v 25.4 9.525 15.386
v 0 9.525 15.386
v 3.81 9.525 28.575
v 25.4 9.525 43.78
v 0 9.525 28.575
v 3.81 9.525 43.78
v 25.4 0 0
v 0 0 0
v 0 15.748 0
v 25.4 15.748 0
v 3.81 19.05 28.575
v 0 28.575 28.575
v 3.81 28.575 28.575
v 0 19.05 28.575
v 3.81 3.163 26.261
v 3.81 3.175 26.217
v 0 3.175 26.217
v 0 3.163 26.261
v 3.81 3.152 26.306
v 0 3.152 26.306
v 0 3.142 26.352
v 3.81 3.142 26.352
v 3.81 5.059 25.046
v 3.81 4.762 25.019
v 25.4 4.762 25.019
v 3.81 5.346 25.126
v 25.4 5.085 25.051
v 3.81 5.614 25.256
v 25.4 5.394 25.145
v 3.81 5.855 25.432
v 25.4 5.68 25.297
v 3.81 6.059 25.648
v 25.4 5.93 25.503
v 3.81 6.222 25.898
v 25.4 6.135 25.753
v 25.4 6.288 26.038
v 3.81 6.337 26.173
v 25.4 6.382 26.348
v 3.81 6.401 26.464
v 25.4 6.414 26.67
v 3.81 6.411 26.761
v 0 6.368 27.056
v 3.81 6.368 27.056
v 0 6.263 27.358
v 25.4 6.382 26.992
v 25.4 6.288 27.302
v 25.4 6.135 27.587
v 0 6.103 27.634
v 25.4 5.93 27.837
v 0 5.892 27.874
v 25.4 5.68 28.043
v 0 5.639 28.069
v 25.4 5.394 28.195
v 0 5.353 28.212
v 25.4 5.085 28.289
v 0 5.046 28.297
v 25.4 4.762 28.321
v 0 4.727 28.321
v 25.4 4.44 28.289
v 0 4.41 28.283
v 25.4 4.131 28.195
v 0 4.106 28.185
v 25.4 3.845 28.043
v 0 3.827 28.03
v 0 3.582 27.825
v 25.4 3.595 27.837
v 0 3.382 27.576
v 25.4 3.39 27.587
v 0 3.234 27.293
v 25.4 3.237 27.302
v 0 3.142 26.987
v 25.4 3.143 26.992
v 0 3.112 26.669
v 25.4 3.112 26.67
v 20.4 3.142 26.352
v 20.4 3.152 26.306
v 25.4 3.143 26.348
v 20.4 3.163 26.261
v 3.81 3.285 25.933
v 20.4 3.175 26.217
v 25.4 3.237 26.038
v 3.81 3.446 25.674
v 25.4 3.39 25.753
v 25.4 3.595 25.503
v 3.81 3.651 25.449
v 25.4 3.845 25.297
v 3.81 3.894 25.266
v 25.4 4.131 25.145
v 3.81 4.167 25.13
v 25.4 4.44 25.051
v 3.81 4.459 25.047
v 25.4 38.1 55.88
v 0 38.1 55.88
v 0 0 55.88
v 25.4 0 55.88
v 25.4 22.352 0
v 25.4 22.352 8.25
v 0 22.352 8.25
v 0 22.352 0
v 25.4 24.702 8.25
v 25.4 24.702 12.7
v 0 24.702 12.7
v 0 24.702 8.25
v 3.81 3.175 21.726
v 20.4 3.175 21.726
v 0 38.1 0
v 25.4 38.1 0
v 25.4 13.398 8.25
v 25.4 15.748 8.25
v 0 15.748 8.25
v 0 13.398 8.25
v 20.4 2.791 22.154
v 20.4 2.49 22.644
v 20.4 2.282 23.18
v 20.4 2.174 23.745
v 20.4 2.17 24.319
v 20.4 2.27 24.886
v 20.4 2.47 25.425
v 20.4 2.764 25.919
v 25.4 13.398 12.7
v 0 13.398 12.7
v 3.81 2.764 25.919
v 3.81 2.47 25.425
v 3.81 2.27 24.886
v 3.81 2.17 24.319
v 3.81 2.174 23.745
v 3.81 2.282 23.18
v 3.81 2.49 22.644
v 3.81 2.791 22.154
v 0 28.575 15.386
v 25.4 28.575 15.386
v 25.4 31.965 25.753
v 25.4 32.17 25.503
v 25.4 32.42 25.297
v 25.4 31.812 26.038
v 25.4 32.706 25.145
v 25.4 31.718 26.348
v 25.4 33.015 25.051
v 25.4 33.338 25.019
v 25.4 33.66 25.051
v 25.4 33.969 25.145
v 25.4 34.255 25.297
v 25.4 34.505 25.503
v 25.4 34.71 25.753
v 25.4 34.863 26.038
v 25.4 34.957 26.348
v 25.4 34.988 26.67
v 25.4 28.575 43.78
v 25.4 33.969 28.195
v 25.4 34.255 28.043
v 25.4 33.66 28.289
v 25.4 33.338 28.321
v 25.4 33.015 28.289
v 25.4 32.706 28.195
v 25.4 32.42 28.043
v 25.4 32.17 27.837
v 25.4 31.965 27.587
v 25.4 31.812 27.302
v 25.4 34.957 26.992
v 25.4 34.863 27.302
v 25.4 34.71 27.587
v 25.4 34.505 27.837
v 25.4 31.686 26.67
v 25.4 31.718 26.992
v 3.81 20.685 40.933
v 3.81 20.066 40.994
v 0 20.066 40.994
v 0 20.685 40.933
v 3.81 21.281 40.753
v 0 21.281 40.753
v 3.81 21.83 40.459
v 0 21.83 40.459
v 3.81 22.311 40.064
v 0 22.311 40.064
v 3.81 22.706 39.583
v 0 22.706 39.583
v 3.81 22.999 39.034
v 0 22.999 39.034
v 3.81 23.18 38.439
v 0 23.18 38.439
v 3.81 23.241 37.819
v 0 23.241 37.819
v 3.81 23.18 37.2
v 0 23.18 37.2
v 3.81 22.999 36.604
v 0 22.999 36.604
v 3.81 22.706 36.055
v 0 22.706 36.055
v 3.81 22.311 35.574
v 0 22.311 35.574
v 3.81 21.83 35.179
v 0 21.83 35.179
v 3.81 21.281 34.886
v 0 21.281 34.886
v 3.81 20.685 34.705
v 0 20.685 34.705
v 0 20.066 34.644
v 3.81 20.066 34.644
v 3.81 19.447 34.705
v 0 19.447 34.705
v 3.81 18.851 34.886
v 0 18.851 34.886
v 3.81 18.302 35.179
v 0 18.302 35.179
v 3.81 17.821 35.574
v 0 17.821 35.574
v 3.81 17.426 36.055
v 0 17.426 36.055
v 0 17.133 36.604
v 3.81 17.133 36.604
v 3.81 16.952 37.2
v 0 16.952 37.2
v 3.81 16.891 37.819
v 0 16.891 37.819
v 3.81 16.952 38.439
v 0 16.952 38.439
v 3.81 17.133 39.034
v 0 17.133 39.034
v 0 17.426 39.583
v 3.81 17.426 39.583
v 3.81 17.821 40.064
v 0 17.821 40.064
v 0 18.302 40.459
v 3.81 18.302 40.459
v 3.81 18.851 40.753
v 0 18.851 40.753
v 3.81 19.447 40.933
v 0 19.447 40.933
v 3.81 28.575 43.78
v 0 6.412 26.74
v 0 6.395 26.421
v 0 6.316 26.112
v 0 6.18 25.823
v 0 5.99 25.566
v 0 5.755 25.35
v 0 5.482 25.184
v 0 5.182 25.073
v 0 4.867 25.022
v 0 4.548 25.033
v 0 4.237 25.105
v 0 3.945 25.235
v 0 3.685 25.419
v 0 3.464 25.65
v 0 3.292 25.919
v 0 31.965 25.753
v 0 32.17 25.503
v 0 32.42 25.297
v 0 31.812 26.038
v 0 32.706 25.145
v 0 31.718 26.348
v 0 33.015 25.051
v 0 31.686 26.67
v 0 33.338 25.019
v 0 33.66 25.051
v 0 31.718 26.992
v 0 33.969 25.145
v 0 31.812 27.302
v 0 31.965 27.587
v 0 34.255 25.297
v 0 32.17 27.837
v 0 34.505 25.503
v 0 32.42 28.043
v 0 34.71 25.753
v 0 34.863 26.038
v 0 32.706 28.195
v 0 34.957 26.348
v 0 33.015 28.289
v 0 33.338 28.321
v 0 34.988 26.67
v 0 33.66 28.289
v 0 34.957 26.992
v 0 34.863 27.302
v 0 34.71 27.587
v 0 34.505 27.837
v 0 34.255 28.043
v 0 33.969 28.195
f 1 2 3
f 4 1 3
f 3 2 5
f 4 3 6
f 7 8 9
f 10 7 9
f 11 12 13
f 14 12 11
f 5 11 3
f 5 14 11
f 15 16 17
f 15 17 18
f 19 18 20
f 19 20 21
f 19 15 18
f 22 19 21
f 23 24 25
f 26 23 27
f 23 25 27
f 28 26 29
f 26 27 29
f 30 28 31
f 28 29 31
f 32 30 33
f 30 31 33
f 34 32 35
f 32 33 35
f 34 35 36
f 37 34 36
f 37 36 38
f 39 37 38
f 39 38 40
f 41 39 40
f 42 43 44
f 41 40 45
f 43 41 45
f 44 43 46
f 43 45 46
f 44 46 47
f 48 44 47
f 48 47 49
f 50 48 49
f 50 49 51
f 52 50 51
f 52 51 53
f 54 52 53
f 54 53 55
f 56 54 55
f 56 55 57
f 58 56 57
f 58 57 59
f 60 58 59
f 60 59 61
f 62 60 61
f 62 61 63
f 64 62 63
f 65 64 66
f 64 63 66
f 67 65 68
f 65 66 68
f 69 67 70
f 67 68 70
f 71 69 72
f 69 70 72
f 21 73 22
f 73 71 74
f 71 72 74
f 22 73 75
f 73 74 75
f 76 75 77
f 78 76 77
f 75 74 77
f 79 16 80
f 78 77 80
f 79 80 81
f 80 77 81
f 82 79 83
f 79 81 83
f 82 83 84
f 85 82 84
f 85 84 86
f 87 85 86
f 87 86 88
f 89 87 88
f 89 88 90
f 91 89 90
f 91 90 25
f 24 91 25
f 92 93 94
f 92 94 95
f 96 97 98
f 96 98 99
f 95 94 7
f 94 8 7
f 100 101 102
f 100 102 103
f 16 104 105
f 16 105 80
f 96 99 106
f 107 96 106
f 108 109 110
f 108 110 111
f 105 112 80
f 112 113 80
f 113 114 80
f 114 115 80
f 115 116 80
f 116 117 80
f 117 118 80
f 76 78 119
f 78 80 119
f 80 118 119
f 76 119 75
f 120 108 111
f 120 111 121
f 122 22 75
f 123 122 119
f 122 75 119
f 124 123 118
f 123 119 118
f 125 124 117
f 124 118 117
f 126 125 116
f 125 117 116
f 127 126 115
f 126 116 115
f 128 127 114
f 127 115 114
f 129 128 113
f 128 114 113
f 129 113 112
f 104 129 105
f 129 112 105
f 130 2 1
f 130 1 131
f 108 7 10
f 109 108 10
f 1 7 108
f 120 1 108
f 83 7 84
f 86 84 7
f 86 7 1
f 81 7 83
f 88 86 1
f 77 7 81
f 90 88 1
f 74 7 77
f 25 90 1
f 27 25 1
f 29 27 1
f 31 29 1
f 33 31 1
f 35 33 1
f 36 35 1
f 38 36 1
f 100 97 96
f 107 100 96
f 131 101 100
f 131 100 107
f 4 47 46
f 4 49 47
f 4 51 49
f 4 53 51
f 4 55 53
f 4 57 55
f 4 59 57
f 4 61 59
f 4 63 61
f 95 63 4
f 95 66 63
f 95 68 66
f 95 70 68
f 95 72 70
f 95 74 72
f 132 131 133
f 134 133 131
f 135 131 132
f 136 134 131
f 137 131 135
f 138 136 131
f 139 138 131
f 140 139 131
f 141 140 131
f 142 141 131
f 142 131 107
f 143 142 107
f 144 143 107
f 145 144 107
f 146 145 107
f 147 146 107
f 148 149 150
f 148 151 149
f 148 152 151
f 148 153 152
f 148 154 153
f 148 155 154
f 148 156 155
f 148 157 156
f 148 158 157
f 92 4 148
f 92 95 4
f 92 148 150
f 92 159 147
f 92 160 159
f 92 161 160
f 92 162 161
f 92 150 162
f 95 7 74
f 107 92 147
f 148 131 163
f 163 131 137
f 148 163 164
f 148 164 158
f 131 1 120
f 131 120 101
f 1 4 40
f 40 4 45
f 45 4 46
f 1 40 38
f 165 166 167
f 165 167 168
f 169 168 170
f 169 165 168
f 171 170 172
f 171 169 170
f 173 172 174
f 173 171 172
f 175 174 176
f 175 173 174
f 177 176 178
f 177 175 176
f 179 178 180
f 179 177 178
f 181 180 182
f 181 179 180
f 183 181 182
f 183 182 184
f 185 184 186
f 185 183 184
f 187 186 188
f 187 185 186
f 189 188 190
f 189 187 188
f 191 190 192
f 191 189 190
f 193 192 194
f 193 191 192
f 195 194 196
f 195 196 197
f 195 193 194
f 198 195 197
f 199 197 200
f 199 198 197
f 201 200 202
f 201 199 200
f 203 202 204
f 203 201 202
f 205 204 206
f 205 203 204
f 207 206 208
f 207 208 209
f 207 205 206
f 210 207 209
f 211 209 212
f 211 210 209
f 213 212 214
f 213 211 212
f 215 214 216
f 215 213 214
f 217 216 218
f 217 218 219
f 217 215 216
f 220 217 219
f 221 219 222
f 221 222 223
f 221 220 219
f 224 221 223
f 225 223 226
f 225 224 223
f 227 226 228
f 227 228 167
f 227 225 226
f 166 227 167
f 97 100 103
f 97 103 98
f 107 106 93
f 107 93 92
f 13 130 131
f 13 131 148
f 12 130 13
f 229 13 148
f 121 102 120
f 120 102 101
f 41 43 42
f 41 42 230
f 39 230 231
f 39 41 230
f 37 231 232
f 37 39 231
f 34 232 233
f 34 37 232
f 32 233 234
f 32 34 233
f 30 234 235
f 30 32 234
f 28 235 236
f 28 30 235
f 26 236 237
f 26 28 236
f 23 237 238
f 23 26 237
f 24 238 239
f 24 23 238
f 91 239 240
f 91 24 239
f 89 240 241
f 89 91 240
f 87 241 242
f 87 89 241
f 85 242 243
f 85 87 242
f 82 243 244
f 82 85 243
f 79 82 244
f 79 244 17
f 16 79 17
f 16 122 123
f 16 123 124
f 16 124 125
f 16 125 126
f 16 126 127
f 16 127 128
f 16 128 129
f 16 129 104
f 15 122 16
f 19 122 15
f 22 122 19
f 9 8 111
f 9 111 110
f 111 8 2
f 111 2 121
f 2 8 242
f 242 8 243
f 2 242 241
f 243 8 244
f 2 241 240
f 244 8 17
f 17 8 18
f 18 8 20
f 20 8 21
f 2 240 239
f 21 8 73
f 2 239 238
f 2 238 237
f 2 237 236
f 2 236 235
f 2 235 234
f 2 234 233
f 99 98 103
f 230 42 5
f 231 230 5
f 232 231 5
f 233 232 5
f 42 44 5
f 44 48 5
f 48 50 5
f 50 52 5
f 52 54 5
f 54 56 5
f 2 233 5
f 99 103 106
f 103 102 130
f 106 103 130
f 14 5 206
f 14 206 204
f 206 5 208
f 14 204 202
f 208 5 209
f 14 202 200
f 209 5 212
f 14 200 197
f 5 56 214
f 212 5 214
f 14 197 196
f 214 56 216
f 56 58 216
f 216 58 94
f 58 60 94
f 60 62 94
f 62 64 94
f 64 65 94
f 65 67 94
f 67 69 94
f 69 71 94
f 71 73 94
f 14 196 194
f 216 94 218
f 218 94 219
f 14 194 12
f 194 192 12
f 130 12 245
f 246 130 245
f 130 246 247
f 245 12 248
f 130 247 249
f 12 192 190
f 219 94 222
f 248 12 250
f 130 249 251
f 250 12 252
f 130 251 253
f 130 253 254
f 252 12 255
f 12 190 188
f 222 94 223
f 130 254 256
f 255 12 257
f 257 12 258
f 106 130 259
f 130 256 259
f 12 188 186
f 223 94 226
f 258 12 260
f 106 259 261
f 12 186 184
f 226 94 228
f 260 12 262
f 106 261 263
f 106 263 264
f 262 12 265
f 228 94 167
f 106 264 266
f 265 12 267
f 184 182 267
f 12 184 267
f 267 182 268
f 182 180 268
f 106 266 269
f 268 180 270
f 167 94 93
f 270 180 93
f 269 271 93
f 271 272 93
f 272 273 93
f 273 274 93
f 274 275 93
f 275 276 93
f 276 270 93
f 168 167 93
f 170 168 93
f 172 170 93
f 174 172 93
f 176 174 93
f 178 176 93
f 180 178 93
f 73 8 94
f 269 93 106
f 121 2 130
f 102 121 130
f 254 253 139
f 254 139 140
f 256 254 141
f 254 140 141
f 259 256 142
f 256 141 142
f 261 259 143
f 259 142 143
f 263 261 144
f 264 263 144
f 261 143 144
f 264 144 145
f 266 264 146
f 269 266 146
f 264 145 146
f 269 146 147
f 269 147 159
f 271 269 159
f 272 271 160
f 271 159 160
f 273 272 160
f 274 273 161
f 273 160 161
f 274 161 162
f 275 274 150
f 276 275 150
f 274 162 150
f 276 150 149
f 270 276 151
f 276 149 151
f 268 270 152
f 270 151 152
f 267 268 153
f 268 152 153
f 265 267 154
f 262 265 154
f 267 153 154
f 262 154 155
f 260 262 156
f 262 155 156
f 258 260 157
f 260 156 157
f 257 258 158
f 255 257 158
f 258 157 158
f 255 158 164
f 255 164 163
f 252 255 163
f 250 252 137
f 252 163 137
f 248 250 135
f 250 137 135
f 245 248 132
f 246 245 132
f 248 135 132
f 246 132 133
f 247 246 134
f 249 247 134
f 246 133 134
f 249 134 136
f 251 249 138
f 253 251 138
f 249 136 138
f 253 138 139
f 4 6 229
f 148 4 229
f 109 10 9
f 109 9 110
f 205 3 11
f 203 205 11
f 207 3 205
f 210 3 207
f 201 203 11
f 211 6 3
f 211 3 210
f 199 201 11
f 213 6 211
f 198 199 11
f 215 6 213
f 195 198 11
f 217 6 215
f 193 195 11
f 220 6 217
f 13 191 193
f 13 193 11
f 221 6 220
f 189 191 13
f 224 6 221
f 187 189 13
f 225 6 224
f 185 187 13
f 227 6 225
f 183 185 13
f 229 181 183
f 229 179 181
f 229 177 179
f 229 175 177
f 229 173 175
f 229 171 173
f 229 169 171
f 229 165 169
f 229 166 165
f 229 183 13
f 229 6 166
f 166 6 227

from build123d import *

# Parameters (mm, degrees)
SKETCH1_W                 = 38.1
SKETCH1_H                 = 50.8
BOSS_EXTRUDE1_DEPTH       = 25.4
CUT_EXTRUDE1_DEPTH        = 25.4
SKETCH3_W                 = 31.75
SKETCH3_H                 = 31.75
CUT_EXTRUDE2_DEPTH        = 21.59
SKETCH5_W                 = 12.7
SKETCH5_H                 = 12.7
CUT_EXTRUDE3_DEPTH        = 3.81
SKETCH4_W                 = 12.7
SKETCH4_H                 = 25.4
CUT_EXTRUDE4_DEPTH        = 3.175
SKETCH6_W                 = 6.35
SKETCH6_H                 = 5.08
SKETCH6_W_2               = 31.75
BOSS_EXTRUDE2_DEPTH       = 25.4
CUT_EXTRUDE5_START        = -25.4
SKETCH7_R                 = 1.7145
CUT_EXTRUDE5_DEPTH        = 25.4
SKETCH8_R                 = 3.175
CUT_EXTRUDE6_DEPTH        = 18.796
CUT_EXTRUDE7_START        = -25.4
SKETCH9_R                 = 3.175
CUT_EXTRUDE7_DEPTH        = 25.4
SKETCH10_R                = 4.826
SKETCH10_R_2              = 3.175
SKETCH10_R_3              = 4.7625
BOSS_EXTRUDE3_DEPTH       = 25.4
SKETCH11_R                = 3.175
BOSS_EXTRUDE4_DEPTH       = 25.4
SKETCH12_R                = 3.175
SKETCH12_R_2              = 1.651
BOSS_EXTRUDE5_DEPTH       = 5
BOSS_EXTRUDE6_DEPTH       = 25.4
BOSS_EXTRUDE7_DEPTH       = 25.4
SKETCH15_W                = 25.4
SKETCH15_H                = 38.1
BOSS_EXTRUDE8_DEPTH       = 5.08
CUT_EXTRUDE9_START        = -21.59
SKETCH16_W                = 9.228
SKETCH16_H                = 3.577281452
CUT_EXTRUDE9_DEPTH        = 21.59
FILLET1_R                 = 30.48
FILLET2_R                 = 2.54
CUT_EXTRUDE10_START       = -21.59
SKETCH17_W                = 31.75
SKETCH17_H                = 27.158947133
CUT_EXTRUDE10_DEPTH       = 21.59
CUT_EXTRUDE11_START       = -21.59
SKETCH18_W                = 31.75
SKETCH18_H                = 1.235371837
CUT_EXTRUDE11_DEPTH       = 21.59
SKETCH19_W                = 5.08
SKETCH19_H                = 28.39431897
BOSS_EXTRUDE9_DEPTH       = 21.59
SKETCH20_R                = 1.651
CUT_EXTRUDE12_DEPTH       = 25.4
BOSS_EXTRUDE10_START      = -3.81
BOSS_EXTRUDE10_DEPTH      = 3.81
SKETCH23_W                = 21.59
SKETCH23_H                = 13.188947133
CUT_EXTRUDE13_DEPTH       = 3.81
BOSS_EXTRUDE13_DEPTH      = 21.59
BOSS_EXTRUDE13_DEPTH_BACK = 3.81
SKETCH24_W                = 1.27
SKETCH24_H                = 28.39431897
SKETCH25_W                = 12.7
SKETCH25_H                = 2.686052867
BOSS_EXTRUDE14_DEPTH      = 31.75


with BuildPart() as part:
    # Sketch1 → Boss-Extrude1 (new body)
    with BuildSketch(Plane.YZ):
        with Locations((19.05, 25.4)):
            Rectangle(SKETCH1_W, SKETCH1_H)
    extrude(amount=BOSS_EXTRUDE1_DEPTH)

    # Sketch2 → Cut-Extrude1 (cut)
    with BuildSketch(Plane.YZ.offset(25.4)):
        Polygon((13.3985, 12.7), (24.7015, 12.7), (24.7015, 8.250084788), (22.352, 8.250084788), (22.352, 0), (15.748, 0), (15.748, 8.250084788), (13.3985, 8.250084788), align=None)
    extrude(amount=-CUT_EXTRUDE1_DEPTH, mode=Mode.SUBTRACT)

    # Sketch3 → Cut-Extrude2 (cut)
    with BuildSketch(Plane.YZ.offset(25.4)):
        with Locations((19.05, 31.75)):
            Rectangle(SKETCH3_W, SKETCH3_H)
    extrude(amount=-CUT_EXTRUDE2_DEPTH, mode=Mode.SUBTRACT)

    # Sketch5 → Cut-Extrude3 (cut)
    with BuildSketch(Plane(origin=(0, 0, 0), x_dir=(0, -1, 0), z_dir=(-1, 0, 0))):
        with Locations((-12.7, 22.225)):
            Rectangle(SKETCH5_W, SKETCH5_H)
    extrude(amount=-CUT_EXTRUDE3_DEPTH, mode=Mode.SUBTRACT)

    # Sketch4 → Cut-Extrude4 (cut)
    with BuildSketch(Plane.XY.offset(15.875)):
        with Locations((10.16, 19.05)):
            Rectangle(SKETCH4_W, SKETCH4_H)
    extrude(amount=-CUT_EXTRUDE4_DEPTH, mode=Mode.SUBTRACT)

    # Sketch6 → Boss-Extrude2 (add)
    with BuildSketch(Plane.YZ.offset(25.4)):
        with Locations((6.35, 18.415)):
            Rectangle(SKETCH6_W, SKETCH6_H)
        with Locations((31.75, 18.415)):
            Rectangle(SKETCH6_W, SKETCH6_H)
        with Locations((19.05, 45.085)):
            Rectangle(SKETCH6_W_2, SKETCH6_H)
    extrude(amount=-BOSS_EXTRUDE2_DEPTH)

    # Sketch7 → Cut-Extrude5 (cut)
    with BuildSketch(Plane(origin=(0, 0, 0), x_dir=(0, -1, 0), z_dir=(-1, 0, 0)).offset(CUT_EXTRUDE5_START)):
        with Locations(Location((-20.066, 46.303766696, 0), (0, 0, 90))):
            Circle(SKETCH7_R)
        with Locations(Location((-5.334, 46.303766696, 0), (0, 0, 90))):
            Circle(SKETCH7_R)
        with Locations(Location((-4.496233304, 16.002, 0), (0, 0, 90))):
            Circle(SKETCH7_R)
        with Locations(Location((-20.903766696, 16.002, 0), (0, 0, 90))):
            Circle(SKETCH7_R)
    extrude(amount=CUT_EXTRUDE5_DEPTH, mode=Mode.SUBTRACT)

    # Sketch8 → Cut-Extrude6 (cut)
    with BuildSketch(Plane(origin=(0, 0, 0), x_dir=(0, -1, 0), z_dir=(-1, 0, 0))):
        with Locations(Location((-20.066, 46.303766696, 0), (0, 0, 90))):
            Circle(SKETCH8_R)
        with Locations(Location((-5.334, 46.303766696, 0), (0, 0, 90))):
            Circle(SKETCH8_R)
        with Locations(Location((-4.496233304, 16.002, 0), (0, 0, 90))):
            Circle(SKETCH8_R)
        with Locations((-20.903766696, 16.002)):
            Circle(SKETCH8_R)
    extrude(amount=-CUT_EXTRUDE6_DEPTH, mode=Mode.SUBTRACT)

    # Sketch9 → Cut-Extrude7 (cut)
    with BuildSketch(Plane(origin=(0, 0, 0), x_dir=(0, -1, 0), z_dir=(-1, 0, 0)).offset(CUT_EXTRUDE7_START)):
        with Locations(Location((-20.066, 37.819300087, 0), (0, 0, 90))):
            Circle(SKETCH9_R)
        with Locations((-5.334, 24.054233304)):
            Circle(SKETCH9_R)
    extrude(amount=CUT_EXTRUDE7_DEPTH, mode=Mode.SUBTRACT)

    # Sketch10 → Boss-Extrude3 (add)
    # profile 1 of 2: a face of its own
    with BuildSketch(Plane.YZ.offset(25.4)):
        with Locations((5.334, 24.054233304)):
            Circle(SKETCH10_R)
        with Locations(Location((5.334, 24.054233304, 0), (0, 0, 90))):
            Circle(SKETCH10_R_2, mode=Mode.SUBTRACT)
    # profile 2 of 2: a face of its own
    with BuildSketch(Plane.YZ.offset(25.4)):
        with Locations((20.066, 37.819300087)):
            Circle(SKETCH10_R_3)
        with Locations(Location((20.066, 37.819300087, 0), (0, 0, 90))):
            Circle(SKETCH10_R_2, mode=Mode.SUBTRACT)
    extrude(amount=-BOSS_EXTRUDE3_DEPTH)

    # Sketch11 → Boss-Extrude4 (add)
    with BuildSketch(Plane(origin=(0, 0, 0), x_dir=(0, -1, 0), z_dir=(-1, 0, 0))):
        with Locations(Location((-20.903766696, 16.002, 0), (0, 0, 357.707557224))):
            Circle(SKETCH11_R)
        with Locations((-4.496233304, 16.002)):
            Circle(SKETCH11_R)
        with Locations((-20.066, 46.303766696)):
            Circle(SKETCH11_R)
        with Locations((-5.334, 46.303766696)):
            Circle(SKETCH11_R)
    extrude(amount=-BOSS_EXTRUDE4_DEPTH)

    # Sketch12 → Boss-Extrude5 (add)
    # profile 1 of 2: a face of its own
    with BuildSketch(Plane.YZ.offset(25.4)):
        with Locations(Location((5.334, 24.054233304, 0), (0, 0, 90))):
            Circle(SKETCH12_R)
        with Locations(Location((5.334, 24.054233304, 0), (0, 0, 270))):
            Circle(SKETCH12_R_2, mode=Mode.SUBTRACT)
    # profile 2 of 2: a face of its own
    with BuildSketch(Plane.YZ.offset(25.4)):
        with Locations(Location((20.066, 37.819300087, 0), (0, 0, 90))):
            Circle(SKETCH12_R)
        with Locations(Location((20.066, 37.819300087, 0), (0, 0, 270))):
            Circle(SKETCH12_R_2, mode=Mode.SUBTRACT)
    extrude(amount=-BOSS_EXTRUDE5_DEPTH)

    # Sketch13 → Boss-Extrude6 (add)
    with BuildSketch(Plane.YZ.offset(25.4)):
        with BuildLine():
            Line((22.225, 42.064311895), (22.225, 42.545))
            Line((22.225, 42.545), (20.656903194, 42.545))
            ThreePointArc((20.656903194, 42.545), (21.461799827, 42.372666874), (22.225, 42.064311895))
        make_face()
    extrude(amount=-BOSS_EXTRUDE6_DEPTH)

    # Sketch14 → Boss-Extrude7 (add)
    with BuildSketch(Plane.YZ.offset(25.4)):
        with BuildLine():
            Line((19.475096806, 42.545), (15.3035, 42.545))
            Line((15.3035, 42.545), (15.3035, 37.819300087))
            ThreePointArc((15.3035, 37.819300087), (16.495595071, 40.971063862), (19.475096806, 42.545))
        make_face()
    extrude(amount=-BOSS_EXTRUDE7_DEPTH)

    # Sketch15 → Boss-Extrude8 (add)
    with BuildSketch(Plane.XY.offset(50.8)):
        with Locations((12.7, 19.05)):
            Rectangle(SKETCH15_W, SKETCH15_H)
    extrude(amount=BOSS_EXTRUDE8_DEPTH)

    # Sketch16 → Cut-Extrude9 (cut)
    with BuildSketch(Plane.YZ.offset(25.4).offset(CUT_EXTRUDE9_START)):
        with Locations((12.700000043, 41.880359274)):
            Rectangle(SKETCH16_W, SKETCH16_H)
    extrude(amount=CUT_EXTRUDE9_DEPTH, mode=Mode.SUBTRACT)

    # Fillet1
    # the kernel refuses this fillet: 30.48 mm, written as the material it takes off along each edge
    with BuildSketch(Plane(origin=(3.81, 15.3035, 40.091718548), x_dir=(0, 0, -1), z_dir=(1, 0, 0))) as fillet1_piece_1:
        with BuildLine():
            CenterArc((10.886595988, 30.48), FILLET1_R, 249.07339313, 20.92660687)
            Line((0, 2.010500043), (0, 0))
            Line((0, 0), (10.886595988, 0))
        make_face()
    extrude(amount=48.806489969, mode=Mode.SUBTRACT)

    # Fillet2
    fillet2_edges = [part.edges().sort_by_distance(p)[0] for p in [
        (14.605, 15.945995831, 35.430373154),
    ]]
    fillet(fillet2_edges, radius=FILLET2_R)

    # Sketch17 → Cut-Extrude10 (cut)
    with BuildSketch(Plane.YZ.offset(25.4).offset(CUT_EXTRUDE10_START)):
        with Locations((19.05, 28.965526434)):
            Rectangle(SKETCH17_W, SKETCH17_H)
    extrude(amount=CUT_EXTRUDE10_DEPTH, mode=Mode.SUBTRACT)

    # Sketch18 → Cut-Extrude11 (cut)
    with BuildSketch(Plane.YZ.offset(25.4).offset(CUT_EXTRUDE11_START)):
        with Locations((19.05, 43.162685919)):
            Rectangle(SKETCH18_W, SKETCH18_H)
    extrude(amount=CUT_EXTRUDE11_DEPTH, mode=Mode.SUBTRACT)

    # Sketch19 → Boss-Extrude9 (add)
    with BuildSketch(Plane.YZ.offset(3.81)):
        with Locations((5.715, 29.583212352)):
            Rectangle(SKETCH19_W, SKETCH19_H)
        with Locations((32.385, 29.583212352)):
            Rectangle(SKETCH19_W, SKETCH19_H)
    extrude(amount=BOSS_EXTRUDE9_DEPTH)

    # Sketch20 → Cut-Extrude12 (cut)
    with BuildSketch(Plane.YZ.offset(25.4)):
        with Locations(Location((4.7625, 26.67, 0), (0, 0, 270))):
            Circle(SKETCH20_R)
        with Locations(Location((33.3375, 26.67, 0), (0, 0, 270))):
            Circle(SKETCH20_R)
    extrude(amount=-CUT_EXTRUDE12_DEPTH, mode=Mode.SUBTRACT)

    # Sketch22 → Boss-Extrude10 (add)
    with BuildSketch(Plane(origin=(0, 0, 0), x_dir=(0, -1, 0), z_dir=(-1, 0, 0)).offset(BOSS_EXTRUDE10_START)):
        with BuildLine():
            Line((-7.023066157, 28.575), (-8.255, 28.575))
            Line((-8.255, 28.575), (-8.255, 27.895852104))
            ThreePointArc((-8.255, 27.895852104), (-7.663911578, 28.280554168), (-7.023066157, 28.575))
        make_face()
        with BuildLine():
            ThreePointArc((-6.367681938, 27.056253732), (-5.182460289, 25.073305178), (-3.175, 26.216519295))
            ThreePointArc((-3.175, 26.216519295), (-3.157324346, 26.283720153), (-3.142492042, 26.351605253))
            ThreePointArc((-3.142492042, 26.351605253), (-6.011696572, 20.952402819), (-6.367681938, 27.056253732))
        make_face()
    extrude(amount=BOSS_EXTRUDE10_DEPTH)

    # Sketch23 → Cut-Extrude13 (cut)
    with BuildSketch(Plane.YZ.offset(3.81)):
        with Locations((19.05, 21.980526434)):
            Rectangle(SKETCH23_W, SKETCH23_H)
    extrude(amount=-CUT_EXTRUDE13_DEPTH, mode=Mode.SUBTRACT)

    # Sketch24 → Boss-Extrude13 (add, two sides: drawn at the far end of the back side and taken through both)
    with BuildSketch(Plane.YZ.offset(3.81).offset(-BOSS_EXTRUDE13_DEPTH_BACK)):
        with Locations((29.21, 29.583212352)):
            Rectangle(SKETCH24_W, SKETCH24_H)
        with Locations((8.89, 29.583212352)):
            Rectangle(SKETCH24_W, SKETCH24_H)
    extrude(amount=BOSS_EXTRUDE13_DEPTH + BOSS_EXTRUDE13_DEPTH_BACK)

    # Sketch25 → Boss-Extrude14 (add)
    with BuildSketch(Plane.XZ.offset(-31.75)):
        with Locations((10.16, 14.043026433)):
            Rectangle(SKETCH25_W, SKETCH25_H)
    extrude(amount=BOSS_EXTRUDE14_DEPTH)


solid = part.part
